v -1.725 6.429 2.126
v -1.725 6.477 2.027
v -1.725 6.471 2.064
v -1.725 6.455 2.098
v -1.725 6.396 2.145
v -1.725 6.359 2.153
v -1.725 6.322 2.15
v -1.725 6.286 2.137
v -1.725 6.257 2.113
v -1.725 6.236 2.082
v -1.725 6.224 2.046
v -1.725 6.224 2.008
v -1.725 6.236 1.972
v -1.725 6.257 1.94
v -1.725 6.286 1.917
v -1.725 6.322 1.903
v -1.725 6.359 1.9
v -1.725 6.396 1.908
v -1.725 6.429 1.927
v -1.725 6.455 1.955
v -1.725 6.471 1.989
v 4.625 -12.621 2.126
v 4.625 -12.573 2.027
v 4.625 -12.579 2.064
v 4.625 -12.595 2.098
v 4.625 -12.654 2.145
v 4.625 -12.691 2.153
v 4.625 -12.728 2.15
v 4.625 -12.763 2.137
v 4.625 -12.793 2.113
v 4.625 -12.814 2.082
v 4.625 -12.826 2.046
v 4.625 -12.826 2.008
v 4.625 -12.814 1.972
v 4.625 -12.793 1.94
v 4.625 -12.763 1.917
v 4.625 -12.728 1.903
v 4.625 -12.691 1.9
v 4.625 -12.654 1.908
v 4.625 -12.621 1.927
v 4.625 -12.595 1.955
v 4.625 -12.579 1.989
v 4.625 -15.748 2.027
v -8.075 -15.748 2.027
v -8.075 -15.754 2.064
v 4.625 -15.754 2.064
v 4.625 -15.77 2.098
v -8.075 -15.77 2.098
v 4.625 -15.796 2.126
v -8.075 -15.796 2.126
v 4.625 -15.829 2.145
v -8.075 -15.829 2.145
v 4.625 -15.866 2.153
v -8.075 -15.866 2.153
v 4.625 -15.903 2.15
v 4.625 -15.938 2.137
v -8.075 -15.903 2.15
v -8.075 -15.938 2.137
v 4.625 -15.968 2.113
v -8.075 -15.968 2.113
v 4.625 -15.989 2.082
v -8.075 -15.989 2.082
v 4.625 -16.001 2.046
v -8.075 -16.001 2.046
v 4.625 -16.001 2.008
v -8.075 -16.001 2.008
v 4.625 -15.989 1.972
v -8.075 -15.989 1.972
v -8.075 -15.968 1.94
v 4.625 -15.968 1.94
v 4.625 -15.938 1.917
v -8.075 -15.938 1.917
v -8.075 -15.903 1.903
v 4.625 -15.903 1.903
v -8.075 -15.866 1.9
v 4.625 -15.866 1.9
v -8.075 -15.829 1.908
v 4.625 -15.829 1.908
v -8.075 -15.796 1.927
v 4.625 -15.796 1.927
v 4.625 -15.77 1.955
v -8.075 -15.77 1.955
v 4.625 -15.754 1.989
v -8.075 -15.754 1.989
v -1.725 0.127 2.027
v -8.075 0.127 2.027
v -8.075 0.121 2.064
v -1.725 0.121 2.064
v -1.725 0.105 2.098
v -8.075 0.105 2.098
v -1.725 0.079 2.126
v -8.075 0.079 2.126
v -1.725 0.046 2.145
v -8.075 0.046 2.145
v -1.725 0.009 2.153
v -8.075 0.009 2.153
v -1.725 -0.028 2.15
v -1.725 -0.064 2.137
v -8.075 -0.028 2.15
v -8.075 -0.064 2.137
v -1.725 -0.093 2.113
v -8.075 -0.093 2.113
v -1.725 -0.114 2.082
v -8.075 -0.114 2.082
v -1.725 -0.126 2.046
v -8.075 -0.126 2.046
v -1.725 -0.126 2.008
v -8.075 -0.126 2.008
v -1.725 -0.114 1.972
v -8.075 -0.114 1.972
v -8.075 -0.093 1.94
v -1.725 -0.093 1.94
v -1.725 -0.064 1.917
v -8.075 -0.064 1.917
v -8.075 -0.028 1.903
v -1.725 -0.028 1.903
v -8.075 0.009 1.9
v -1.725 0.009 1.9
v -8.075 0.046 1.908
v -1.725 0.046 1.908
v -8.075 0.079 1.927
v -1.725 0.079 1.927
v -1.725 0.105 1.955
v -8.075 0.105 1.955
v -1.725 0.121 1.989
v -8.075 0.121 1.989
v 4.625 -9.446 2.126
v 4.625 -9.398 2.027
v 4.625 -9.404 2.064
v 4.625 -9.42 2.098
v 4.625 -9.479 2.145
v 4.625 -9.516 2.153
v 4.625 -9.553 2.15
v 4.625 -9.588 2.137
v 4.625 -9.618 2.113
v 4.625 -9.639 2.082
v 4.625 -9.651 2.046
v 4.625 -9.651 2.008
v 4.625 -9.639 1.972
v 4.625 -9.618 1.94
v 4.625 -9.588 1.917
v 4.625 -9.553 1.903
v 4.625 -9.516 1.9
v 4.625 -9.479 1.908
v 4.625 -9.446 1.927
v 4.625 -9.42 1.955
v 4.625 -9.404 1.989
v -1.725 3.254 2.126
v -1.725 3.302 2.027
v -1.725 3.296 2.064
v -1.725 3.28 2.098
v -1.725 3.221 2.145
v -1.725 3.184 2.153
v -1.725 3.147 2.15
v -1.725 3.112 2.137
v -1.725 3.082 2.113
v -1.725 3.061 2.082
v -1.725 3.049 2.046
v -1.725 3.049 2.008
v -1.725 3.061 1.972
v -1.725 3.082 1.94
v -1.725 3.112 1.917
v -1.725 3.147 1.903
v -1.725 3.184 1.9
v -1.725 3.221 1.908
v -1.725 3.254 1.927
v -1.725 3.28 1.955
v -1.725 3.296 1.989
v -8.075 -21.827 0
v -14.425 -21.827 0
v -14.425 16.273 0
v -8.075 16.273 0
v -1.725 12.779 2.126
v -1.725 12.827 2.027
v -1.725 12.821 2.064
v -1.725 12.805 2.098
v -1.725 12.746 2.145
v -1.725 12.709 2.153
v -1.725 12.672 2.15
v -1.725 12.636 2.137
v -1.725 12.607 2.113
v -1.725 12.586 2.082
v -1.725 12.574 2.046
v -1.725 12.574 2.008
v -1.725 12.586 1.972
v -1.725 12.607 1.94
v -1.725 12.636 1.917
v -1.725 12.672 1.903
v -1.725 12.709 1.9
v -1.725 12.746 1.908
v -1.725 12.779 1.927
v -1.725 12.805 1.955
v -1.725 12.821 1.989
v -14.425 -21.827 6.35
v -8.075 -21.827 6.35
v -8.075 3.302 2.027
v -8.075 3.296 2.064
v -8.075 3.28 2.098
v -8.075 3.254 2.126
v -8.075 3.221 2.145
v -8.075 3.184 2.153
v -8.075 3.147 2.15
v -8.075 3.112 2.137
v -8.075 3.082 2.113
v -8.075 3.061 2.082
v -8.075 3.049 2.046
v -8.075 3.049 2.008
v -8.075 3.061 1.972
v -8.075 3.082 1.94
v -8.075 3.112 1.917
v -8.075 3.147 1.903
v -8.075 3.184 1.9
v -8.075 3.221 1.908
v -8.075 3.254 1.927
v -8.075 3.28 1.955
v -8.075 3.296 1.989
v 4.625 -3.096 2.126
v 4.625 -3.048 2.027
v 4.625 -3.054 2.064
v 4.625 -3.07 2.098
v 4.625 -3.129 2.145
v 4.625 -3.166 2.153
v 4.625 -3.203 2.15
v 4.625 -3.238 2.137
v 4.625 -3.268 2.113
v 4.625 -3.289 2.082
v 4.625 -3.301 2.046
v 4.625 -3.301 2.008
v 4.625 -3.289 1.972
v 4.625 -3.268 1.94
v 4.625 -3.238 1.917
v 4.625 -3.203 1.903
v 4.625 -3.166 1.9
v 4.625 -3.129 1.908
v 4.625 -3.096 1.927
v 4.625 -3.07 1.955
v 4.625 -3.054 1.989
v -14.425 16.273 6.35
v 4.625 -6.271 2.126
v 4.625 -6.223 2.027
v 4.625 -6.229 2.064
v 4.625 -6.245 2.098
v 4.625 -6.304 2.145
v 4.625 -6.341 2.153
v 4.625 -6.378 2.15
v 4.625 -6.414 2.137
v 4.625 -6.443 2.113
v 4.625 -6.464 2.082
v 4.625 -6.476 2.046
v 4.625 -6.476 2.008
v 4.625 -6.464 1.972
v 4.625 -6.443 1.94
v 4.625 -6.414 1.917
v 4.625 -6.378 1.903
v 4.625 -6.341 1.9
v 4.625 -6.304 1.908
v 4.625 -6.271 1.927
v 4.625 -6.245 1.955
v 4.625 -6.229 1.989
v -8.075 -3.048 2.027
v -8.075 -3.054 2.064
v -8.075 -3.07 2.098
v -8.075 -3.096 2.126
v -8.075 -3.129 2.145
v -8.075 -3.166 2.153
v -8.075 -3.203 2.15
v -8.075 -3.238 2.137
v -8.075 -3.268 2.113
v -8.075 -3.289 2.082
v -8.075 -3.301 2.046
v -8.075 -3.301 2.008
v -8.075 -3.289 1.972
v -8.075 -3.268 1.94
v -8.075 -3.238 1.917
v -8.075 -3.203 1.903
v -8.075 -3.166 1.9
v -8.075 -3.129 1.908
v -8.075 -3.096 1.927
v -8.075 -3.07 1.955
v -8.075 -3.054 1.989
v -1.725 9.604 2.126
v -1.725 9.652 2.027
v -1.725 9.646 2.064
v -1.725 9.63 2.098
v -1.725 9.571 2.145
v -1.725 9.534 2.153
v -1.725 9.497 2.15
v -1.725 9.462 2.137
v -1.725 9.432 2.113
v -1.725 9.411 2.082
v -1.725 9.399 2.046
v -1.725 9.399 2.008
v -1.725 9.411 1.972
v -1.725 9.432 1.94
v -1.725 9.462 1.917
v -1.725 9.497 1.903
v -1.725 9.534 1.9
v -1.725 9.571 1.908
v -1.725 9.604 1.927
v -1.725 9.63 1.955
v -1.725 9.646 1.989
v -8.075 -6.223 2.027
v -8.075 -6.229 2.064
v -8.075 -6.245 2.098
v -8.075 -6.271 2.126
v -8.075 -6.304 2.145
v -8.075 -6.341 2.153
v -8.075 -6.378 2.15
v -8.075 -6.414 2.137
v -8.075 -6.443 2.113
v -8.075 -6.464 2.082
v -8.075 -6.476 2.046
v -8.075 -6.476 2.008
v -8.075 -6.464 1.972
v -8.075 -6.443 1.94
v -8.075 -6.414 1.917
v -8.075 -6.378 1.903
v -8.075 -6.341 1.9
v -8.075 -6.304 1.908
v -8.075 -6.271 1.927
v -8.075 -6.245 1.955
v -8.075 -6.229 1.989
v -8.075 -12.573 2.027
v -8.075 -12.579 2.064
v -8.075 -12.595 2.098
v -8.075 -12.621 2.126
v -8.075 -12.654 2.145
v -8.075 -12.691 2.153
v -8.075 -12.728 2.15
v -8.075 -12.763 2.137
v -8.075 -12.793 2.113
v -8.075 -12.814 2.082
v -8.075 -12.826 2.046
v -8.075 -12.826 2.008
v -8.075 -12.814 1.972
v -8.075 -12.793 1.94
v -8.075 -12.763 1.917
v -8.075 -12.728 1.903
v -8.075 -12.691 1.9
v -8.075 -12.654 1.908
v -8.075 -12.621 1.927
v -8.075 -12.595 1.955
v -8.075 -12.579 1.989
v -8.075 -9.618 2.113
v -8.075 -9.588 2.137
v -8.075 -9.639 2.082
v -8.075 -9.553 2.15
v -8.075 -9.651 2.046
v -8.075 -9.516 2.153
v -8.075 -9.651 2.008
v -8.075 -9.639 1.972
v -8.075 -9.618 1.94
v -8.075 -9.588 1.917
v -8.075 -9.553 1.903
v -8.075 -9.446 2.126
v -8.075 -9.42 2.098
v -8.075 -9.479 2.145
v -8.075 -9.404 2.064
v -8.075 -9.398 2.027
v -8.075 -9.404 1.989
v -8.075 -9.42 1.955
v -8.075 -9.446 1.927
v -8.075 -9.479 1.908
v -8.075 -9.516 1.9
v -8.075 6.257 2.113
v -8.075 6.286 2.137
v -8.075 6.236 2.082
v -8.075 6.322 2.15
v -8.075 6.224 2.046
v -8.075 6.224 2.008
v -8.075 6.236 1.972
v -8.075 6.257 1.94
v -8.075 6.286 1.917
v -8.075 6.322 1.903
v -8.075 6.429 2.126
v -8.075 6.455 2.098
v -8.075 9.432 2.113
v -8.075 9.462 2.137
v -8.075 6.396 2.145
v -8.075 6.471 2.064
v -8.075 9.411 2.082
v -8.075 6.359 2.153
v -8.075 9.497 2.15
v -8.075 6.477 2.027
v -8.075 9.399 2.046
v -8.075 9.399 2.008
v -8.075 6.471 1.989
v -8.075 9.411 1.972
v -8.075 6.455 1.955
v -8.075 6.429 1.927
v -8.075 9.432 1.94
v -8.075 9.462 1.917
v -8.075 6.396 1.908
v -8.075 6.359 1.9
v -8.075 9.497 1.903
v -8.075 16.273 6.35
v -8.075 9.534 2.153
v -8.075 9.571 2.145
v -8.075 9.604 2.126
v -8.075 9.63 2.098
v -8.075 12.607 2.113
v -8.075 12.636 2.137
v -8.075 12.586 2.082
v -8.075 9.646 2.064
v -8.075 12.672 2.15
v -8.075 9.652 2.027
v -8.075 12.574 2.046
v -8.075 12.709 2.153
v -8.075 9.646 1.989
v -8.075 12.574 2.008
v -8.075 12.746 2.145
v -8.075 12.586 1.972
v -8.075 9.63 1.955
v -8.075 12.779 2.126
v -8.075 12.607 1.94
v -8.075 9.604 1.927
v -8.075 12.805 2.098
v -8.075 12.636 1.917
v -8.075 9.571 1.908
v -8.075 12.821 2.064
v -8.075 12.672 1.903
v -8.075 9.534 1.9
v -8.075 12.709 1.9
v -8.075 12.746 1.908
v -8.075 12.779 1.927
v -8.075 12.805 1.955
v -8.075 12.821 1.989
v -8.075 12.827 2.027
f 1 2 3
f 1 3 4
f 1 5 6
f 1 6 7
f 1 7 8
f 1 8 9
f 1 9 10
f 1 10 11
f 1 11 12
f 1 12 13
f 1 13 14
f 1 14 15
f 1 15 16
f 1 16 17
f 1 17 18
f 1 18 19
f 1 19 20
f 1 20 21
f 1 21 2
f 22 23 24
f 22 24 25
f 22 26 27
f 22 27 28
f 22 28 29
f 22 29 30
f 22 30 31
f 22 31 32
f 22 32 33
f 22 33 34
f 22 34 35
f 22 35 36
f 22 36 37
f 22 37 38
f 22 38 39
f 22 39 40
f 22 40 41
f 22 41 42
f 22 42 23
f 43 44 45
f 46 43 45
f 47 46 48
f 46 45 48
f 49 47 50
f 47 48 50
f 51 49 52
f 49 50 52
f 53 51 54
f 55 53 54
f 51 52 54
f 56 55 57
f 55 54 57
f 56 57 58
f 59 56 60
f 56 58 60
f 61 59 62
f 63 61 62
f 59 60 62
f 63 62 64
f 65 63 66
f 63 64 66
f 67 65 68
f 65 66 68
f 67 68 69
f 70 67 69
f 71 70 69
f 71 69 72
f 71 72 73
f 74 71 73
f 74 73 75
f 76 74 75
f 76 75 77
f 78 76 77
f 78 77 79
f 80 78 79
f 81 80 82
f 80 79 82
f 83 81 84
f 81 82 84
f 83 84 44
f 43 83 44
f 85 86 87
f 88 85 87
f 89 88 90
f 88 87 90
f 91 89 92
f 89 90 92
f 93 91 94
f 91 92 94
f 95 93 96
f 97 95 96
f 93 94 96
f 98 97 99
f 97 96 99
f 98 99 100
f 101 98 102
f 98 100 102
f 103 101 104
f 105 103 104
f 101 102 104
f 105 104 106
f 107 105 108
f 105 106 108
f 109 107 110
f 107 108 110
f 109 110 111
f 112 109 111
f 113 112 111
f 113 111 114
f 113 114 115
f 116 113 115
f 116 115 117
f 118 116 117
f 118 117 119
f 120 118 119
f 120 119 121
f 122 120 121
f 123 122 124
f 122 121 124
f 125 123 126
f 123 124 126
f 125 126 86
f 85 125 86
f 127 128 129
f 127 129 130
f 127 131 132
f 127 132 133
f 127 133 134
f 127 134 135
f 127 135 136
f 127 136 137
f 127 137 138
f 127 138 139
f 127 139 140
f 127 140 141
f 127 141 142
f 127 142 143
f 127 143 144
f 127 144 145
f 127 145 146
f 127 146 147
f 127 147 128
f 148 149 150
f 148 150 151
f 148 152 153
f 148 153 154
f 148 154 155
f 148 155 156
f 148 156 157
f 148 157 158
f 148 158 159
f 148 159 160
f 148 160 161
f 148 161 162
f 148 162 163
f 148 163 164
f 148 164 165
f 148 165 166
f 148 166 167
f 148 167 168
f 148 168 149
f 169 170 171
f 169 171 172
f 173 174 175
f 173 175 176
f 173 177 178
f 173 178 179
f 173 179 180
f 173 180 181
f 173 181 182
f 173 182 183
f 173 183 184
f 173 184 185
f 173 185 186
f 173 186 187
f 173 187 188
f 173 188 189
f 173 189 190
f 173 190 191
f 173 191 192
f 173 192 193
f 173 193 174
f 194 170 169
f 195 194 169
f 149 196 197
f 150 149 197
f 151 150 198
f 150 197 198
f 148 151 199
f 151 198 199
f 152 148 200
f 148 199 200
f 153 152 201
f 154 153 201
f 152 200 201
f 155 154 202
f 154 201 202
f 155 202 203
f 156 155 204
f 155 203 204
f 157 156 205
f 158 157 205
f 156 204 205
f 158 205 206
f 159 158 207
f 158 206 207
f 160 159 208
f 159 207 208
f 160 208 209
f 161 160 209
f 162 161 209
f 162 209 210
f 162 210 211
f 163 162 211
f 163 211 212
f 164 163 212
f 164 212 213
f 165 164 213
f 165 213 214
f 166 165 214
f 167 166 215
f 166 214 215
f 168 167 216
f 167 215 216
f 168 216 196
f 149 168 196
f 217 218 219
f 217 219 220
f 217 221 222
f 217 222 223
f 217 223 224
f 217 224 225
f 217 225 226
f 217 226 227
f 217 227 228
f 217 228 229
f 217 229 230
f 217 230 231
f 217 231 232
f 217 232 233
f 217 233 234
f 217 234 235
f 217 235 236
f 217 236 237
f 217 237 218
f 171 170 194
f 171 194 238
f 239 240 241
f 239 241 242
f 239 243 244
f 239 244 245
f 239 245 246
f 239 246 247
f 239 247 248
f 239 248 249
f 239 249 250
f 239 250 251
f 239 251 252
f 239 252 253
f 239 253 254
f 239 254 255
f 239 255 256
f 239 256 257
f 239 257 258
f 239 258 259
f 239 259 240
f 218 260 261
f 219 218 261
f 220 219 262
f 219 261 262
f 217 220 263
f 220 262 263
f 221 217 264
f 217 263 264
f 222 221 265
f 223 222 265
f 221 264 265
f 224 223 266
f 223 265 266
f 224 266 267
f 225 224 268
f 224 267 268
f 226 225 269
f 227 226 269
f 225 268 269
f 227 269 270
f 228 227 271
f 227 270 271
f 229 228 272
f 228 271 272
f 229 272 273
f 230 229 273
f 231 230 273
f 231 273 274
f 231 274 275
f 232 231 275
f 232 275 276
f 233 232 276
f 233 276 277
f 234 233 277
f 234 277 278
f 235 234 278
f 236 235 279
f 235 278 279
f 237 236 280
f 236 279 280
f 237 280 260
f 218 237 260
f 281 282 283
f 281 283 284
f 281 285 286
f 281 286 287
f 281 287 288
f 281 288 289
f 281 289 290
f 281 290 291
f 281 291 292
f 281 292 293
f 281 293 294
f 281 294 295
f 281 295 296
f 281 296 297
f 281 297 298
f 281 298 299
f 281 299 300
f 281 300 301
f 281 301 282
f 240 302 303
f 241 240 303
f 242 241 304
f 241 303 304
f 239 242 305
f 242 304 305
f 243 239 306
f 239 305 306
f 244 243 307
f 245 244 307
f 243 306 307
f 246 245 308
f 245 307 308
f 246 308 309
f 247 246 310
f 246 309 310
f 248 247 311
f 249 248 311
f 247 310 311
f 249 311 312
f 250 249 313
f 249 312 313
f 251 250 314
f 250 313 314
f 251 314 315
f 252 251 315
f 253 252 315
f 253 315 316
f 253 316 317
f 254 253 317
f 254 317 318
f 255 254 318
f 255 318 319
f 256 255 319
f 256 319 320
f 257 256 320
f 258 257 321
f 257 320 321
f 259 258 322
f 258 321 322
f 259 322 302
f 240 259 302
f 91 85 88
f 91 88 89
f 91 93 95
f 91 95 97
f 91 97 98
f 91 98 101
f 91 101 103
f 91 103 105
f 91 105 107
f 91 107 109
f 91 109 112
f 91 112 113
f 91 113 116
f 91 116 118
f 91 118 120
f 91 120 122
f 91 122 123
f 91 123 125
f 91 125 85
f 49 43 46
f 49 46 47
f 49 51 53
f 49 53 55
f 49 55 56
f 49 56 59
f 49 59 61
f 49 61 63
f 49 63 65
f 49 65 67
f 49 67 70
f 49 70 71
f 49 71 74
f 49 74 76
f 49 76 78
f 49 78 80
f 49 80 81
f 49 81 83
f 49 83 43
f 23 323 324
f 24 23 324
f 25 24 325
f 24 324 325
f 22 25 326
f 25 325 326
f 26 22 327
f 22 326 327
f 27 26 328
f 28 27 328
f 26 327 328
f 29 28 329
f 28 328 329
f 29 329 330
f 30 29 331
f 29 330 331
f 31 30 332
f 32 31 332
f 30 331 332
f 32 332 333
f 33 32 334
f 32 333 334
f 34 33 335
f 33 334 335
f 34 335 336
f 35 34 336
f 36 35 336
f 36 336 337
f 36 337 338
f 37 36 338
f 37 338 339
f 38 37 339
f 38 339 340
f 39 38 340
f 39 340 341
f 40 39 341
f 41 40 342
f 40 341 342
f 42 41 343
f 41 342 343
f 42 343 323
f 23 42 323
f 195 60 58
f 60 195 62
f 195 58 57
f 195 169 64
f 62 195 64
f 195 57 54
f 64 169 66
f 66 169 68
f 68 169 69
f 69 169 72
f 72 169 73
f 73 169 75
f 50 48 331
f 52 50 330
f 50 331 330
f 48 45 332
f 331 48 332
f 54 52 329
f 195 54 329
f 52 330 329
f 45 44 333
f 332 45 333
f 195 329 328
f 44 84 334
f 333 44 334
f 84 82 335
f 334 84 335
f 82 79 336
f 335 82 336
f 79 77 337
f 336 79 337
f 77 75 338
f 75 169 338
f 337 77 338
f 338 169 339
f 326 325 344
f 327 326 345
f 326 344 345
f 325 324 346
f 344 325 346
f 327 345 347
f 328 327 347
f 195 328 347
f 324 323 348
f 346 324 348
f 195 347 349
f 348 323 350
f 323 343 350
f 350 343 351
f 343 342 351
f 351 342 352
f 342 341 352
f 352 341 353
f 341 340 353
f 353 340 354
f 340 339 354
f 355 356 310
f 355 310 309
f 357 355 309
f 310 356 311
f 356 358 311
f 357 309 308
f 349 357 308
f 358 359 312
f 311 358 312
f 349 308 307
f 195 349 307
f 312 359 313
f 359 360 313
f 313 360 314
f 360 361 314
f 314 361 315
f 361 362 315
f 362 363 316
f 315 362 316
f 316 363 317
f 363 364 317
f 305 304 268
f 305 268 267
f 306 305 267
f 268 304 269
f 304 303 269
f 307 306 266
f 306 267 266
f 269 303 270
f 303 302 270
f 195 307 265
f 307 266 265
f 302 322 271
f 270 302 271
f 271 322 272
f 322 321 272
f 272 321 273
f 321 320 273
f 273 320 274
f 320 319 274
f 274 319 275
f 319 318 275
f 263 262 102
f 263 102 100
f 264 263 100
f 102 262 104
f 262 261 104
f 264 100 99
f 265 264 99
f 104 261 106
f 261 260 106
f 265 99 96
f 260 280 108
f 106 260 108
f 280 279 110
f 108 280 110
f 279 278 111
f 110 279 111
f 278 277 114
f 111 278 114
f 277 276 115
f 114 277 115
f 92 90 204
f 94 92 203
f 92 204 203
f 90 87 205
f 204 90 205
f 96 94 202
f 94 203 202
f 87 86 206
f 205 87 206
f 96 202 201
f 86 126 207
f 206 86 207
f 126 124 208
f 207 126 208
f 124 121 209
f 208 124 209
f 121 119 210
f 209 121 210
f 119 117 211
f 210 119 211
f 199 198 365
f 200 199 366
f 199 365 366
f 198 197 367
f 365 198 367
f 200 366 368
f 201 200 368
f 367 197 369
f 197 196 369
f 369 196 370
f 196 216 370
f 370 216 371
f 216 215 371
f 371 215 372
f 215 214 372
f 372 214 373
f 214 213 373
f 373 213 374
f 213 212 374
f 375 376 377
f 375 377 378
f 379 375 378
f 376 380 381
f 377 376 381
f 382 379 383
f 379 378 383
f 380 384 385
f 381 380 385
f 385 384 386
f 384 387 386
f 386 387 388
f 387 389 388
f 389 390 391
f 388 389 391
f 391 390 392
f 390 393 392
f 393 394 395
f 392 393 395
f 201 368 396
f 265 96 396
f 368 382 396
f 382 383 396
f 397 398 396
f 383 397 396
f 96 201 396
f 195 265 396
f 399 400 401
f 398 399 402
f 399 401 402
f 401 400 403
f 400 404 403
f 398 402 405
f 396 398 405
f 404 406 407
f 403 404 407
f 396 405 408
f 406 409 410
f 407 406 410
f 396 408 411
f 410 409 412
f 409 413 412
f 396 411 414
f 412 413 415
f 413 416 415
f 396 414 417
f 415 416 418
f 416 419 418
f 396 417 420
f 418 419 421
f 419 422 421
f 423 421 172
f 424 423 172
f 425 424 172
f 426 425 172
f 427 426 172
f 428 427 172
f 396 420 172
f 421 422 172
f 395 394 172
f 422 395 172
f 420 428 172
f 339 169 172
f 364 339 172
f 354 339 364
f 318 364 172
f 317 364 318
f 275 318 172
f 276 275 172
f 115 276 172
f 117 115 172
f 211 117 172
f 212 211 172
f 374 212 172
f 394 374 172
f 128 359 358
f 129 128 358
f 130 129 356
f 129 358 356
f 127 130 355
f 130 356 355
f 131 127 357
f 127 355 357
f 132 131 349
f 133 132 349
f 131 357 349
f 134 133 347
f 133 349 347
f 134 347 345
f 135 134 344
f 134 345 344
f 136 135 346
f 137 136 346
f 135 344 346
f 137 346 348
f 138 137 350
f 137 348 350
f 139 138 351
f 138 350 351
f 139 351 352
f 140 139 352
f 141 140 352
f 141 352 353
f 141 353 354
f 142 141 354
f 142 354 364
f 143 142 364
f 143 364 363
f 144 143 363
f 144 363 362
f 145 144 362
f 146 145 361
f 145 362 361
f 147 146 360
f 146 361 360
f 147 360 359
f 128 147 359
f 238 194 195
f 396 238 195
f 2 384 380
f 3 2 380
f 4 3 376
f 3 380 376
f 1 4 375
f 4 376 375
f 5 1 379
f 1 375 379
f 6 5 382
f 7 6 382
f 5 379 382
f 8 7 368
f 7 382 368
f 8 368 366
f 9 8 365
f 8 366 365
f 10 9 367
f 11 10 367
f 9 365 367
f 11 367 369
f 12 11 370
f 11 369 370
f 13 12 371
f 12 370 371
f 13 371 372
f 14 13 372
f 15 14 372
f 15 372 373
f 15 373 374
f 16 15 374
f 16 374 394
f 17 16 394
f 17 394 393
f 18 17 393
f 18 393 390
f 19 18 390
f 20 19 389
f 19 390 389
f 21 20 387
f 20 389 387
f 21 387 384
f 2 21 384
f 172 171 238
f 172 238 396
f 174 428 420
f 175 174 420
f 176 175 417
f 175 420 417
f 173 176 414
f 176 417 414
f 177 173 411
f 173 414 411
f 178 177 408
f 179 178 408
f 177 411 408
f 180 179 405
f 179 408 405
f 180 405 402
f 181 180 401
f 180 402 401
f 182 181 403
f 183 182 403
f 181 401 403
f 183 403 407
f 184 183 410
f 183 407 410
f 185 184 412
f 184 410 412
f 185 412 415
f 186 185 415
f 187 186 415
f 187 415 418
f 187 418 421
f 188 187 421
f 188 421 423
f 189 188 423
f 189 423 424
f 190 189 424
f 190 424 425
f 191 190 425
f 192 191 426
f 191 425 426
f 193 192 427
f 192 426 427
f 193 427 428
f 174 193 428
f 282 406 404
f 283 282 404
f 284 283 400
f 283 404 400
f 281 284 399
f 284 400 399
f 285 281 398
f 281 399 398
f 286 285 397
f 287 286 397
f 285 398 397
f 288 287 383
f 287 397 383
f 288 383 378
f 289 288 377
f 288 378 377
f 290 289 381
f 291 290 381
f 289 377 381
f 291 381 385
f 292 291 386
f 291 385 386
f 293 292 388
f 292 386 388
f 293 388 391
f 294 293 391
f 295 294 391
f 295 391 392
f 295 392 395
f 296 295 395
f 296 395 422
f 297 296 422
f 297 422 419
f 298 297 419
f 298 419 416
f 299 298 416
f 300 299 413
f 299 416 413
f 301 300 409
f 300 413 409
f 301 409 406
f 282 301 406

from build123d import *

# Parameters (mm, degrees)
F0_W     = 6.35
F0_H     = 38.1
F1_DEPTH = 6.35
F2_R     = 0.127
F3_DEPTH = 12.7
F4_DEPTH = 6.35


with BuildPart() as f1:
    # F0 (on Top) → F1 (new body)
    with BuildSketch(Plane.XY):
        with Locations((-11.249706, -2.776845)):
            Rectangle(F0_W, F0_H)
    extrude(amount=F1_DEPTH)

    # F2 (on face) → F3 (join)
    with BuildSketch(Plane.YZ.offset(-8.074706)):
        with Locations((-3.175, 2.026659)):
            Circle(F2_R)
        with Locations((-6.35, 2.026659)):
            Circle(F2_R)
        with Locations((-9.525, 2.026659)):
            Circle(F2_R)
        with Locations((-12.7, 2.026659)):
            Circle(F2_R)
        with Locations((-15.875, 2.026659)):
            Circle(F2_R)
    extrude(amount=F3_DEPTH)

    # F2 (on face) → F4 (join)
    with BuildSketch(Plane.YZ.offset(-8.074706)):
        with Locations((12.7, 2.026659)):
            Circle(F2_R)
        with Locations((9.525, 2.026659)):
            Circle(F2_R)
        with Locations((6.35, 2.026659)):
            Circle(F2_R)
        with Locations((3.175, 2.026659)):
            Circle(F2_R)
        with Locations((0, 2.026659)):
            Circle(F2_R)
    extrude(amount=F4_DEPTH)


solid = f1.part
